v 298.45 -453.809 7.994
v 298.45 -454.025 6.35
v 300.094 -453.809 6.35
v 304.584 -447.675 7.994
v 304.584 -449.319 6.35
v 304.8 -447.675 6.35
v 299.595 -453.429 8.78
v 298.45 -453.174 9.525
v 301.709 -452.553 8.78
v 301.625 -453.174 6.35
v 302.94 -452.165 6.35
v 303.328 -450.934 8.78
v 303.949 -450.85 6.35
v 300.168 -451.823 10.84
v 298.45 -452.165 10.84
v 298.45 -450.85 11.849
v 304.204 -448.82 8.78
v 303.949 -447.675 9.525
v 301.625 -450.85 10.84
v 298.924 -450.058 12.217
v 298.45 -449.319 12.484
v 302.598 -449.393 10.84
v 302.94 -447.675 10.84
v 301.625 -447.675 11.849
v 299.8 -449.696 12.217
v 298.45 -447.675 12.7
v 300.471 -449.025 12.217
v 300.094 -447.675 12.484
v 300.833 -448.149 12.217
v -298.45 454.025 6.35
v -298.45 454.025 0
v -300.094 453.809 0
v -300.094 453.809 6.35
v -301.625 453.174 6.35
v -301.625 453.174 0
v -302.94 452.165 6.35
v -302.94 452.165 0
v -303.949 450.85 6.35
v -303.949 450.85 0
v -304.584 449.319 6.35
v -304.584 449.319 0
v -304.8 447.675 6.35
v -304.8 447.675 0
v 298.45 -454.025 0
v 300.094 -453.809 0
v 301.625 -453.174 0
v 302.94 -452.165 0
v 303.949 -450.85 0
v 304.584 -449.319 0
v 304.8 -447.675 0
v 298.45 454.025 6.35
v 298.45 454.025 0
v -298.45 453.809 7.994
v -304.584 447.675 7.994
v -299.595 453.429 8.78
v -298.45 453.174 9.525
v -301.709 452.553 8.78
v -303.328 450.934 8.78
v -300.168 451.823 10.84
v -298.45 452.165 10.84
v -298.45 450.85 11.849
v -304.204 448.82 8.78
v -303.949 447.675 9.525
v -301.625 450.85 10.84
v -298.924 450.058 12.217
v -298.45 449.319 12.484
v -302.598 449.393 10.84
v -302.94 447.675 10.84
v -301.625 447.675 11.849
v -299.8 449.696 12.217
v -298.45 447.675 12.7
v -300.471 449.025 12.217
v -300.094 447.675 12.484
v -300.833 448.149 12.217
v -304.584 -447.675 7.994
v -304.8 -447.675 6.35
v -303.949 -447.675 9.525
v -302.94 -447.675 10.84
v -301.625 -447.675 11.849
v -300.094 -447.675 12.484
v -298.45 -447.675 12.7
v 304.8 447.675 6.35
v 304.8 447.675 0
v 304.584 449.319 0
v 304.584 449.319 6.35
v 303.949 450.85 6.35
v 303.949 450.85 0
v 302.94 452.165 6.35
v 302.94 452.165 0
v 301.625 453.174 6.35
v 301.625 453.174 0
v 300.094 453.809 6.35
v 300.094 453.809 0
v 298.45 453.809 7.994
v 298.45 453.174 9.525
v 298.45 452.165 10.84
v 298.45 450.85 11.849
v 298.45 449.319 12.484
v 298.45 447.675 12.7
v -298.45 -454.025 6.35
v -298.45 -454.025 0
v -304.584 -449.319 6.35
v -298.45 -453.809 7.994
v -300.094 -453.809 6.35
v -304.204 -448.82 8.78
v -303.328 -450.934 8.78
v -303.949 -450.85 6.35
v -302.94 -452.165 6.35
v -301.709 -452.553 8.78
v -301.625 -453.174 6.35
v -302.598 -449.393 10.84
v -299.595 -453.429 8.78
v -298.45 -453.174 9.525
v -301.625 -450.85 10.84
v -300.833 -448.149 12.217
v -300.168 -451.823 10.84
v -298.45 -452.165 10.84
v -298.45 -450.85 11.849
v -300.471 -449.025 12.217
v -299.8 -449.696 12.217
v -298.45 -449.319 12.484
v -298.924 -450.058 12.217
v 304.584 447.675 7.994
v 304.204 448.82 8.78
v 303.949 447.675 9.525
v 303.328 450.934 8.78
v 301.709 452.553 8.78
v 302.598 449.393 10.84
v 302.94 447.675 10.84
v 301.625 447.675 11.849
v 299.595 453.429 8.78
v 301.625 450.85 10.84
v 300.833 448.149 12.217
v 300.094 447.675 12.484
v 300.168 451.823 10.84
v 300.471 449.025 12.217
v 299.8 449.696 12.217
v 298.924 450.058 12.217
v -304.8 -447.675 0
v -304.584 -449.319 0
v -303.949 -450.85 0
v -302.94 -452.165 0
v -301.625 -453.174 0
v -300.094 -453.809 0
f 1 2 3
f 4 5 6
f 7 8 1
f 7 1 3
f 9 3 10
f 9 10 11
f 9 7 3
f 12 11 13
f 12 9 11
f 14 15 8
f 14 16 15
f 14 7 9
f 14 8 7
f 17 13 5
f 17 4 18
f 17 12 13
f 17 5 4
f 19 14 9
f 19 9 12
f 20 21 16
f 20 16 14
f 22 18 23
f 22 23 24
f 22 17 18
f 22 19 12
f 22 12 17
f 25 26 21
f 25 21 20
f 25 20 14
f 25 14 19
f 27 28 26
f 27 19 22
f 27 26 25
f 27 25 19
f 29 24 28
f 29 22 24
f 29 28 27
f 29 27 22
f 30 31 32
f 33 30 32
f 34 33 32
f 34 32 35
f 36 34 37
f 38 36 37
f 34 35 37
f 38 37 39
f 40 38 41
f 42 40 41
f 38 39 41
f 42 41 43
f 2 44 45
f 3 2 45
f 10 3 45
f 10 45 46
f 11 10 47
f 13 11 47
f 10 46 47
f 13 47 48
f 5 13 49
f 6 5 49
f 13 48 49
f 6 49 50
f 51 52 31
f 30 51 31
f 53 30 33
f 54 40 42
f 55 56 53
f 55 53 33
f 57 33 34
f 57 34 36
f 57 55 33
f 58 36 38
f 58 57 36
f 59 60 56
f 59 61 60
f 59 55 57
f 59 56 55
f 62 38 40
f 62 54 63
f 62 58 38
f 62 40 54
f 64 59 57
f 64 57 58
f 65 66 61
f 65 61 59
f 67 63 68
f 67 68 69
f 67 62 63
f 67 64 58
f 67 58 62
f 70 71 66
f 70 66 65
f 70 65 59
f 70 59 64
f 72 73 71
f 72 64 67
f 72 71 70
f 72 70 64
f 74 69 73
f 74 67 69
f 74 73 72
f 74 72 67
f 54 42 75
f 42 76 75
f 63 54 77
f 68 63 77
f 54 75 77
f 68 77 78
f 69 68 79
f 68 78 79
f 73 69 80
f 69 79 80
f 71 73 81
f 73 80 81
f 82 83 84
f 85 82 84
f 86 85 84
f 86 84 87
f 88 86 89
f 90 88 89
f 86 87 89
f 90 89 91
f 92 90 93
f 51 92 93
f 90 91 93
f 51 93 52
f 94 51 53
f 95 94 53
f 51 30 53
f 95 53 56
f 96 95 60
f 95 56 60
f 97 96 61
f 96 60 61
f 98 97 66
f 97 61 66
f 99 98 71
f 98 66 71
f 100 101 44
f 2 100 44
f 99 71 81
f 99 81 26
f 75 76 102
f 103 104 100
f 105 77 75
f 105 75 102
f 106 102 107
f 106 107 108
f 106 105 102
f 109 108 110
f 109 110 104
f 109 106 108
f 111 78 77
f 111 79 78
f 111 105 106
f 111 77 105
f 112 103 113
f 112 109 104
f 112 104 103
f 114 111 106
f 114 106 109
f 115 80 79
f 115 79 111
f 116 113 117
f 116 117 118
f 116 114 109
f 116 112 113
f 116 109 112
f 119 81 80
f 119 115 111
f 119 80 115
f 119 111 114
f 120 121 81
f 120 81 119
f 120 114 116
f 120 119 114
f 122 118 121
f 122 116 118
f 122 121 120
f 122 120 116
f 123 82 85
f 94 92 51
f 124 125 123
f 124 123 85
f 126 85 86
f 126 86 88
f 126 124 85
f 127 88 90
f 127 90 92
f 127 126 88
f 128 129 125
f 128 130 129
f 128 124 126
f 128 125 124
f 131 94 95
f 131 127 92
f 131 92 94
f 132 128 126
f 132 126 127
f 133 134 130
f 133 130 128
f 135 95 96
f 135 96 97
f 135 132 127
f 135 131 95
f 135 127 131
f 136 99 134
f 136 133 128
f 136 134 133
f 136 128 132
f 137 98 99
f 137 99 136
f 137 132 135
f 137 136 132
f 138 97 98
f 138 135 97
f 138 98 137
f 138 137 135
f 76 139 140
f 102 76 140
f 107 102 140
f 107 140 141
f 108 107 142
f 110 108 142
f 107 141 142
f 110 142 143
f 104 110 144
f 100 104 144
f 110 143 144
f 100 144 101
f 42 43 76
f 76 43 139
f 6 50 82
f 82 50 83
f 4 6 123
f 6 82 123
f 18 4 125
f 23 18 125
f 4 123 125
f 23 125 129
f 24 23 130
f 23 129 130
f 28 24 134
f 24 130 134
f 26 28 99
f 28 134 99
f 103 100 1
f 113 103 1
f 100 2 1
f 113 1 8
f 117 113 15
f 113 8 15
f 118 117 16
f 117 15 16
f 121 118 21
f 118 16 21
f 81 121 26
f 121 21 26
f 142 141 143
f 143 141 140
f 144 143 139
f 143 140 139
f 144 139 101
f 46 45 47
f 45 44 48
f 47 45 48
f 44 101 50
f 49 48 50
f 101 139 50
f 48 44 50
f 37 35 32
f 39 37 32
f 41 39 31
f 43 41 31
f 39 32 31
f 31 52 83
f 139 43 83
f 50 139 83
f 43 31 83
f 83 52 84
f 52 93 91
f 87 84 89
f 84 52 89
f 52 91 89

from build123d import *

# Parameters (mm, degrees)
F1_DEPTH = 12.7
F2_R     = 6.35


with BuildPart() as f1:
    # F0 (on Top) → F1 (new body)
    with BuildSketch(Plane.XY):
        with BuildLine():
            Line((-298.45, -454.025), (298.45, -454.025))
            ThreePointArc((298.45, -454.025), (302.9401280605, -452.1651280605), (304.8, -447.675))
            Line((304.8, -447.675), (304.8, 447.675))
            ThreePointArc((304.8, 447.675), (302.9401280605, 452.1651280605), (298.45, 454.025))
            Line((298.45, 454.025), (-298.45, 454.025))
            ThreePointArc((-298.45, 454.025), (-302.9401280605, 452.1651280605), (-304.8, 447.675))
            Line((-304.8, 447.675), (-304.8, -447.675))
            ThreePointArc((-304.8, -447.675), (-302.9401280605, -452.1651280605), (-298.45, -454.025))
        make_face()
    extrude(amount=F1_DEPTH)

    # F2
    f2_edges = [f1.edges().sort_by_distance(p)[0] for p in [
        (-304.8, 0, 12.7),
    ]]
    fillet(f2_edges, radius=F2_R)


solid = f1.part
